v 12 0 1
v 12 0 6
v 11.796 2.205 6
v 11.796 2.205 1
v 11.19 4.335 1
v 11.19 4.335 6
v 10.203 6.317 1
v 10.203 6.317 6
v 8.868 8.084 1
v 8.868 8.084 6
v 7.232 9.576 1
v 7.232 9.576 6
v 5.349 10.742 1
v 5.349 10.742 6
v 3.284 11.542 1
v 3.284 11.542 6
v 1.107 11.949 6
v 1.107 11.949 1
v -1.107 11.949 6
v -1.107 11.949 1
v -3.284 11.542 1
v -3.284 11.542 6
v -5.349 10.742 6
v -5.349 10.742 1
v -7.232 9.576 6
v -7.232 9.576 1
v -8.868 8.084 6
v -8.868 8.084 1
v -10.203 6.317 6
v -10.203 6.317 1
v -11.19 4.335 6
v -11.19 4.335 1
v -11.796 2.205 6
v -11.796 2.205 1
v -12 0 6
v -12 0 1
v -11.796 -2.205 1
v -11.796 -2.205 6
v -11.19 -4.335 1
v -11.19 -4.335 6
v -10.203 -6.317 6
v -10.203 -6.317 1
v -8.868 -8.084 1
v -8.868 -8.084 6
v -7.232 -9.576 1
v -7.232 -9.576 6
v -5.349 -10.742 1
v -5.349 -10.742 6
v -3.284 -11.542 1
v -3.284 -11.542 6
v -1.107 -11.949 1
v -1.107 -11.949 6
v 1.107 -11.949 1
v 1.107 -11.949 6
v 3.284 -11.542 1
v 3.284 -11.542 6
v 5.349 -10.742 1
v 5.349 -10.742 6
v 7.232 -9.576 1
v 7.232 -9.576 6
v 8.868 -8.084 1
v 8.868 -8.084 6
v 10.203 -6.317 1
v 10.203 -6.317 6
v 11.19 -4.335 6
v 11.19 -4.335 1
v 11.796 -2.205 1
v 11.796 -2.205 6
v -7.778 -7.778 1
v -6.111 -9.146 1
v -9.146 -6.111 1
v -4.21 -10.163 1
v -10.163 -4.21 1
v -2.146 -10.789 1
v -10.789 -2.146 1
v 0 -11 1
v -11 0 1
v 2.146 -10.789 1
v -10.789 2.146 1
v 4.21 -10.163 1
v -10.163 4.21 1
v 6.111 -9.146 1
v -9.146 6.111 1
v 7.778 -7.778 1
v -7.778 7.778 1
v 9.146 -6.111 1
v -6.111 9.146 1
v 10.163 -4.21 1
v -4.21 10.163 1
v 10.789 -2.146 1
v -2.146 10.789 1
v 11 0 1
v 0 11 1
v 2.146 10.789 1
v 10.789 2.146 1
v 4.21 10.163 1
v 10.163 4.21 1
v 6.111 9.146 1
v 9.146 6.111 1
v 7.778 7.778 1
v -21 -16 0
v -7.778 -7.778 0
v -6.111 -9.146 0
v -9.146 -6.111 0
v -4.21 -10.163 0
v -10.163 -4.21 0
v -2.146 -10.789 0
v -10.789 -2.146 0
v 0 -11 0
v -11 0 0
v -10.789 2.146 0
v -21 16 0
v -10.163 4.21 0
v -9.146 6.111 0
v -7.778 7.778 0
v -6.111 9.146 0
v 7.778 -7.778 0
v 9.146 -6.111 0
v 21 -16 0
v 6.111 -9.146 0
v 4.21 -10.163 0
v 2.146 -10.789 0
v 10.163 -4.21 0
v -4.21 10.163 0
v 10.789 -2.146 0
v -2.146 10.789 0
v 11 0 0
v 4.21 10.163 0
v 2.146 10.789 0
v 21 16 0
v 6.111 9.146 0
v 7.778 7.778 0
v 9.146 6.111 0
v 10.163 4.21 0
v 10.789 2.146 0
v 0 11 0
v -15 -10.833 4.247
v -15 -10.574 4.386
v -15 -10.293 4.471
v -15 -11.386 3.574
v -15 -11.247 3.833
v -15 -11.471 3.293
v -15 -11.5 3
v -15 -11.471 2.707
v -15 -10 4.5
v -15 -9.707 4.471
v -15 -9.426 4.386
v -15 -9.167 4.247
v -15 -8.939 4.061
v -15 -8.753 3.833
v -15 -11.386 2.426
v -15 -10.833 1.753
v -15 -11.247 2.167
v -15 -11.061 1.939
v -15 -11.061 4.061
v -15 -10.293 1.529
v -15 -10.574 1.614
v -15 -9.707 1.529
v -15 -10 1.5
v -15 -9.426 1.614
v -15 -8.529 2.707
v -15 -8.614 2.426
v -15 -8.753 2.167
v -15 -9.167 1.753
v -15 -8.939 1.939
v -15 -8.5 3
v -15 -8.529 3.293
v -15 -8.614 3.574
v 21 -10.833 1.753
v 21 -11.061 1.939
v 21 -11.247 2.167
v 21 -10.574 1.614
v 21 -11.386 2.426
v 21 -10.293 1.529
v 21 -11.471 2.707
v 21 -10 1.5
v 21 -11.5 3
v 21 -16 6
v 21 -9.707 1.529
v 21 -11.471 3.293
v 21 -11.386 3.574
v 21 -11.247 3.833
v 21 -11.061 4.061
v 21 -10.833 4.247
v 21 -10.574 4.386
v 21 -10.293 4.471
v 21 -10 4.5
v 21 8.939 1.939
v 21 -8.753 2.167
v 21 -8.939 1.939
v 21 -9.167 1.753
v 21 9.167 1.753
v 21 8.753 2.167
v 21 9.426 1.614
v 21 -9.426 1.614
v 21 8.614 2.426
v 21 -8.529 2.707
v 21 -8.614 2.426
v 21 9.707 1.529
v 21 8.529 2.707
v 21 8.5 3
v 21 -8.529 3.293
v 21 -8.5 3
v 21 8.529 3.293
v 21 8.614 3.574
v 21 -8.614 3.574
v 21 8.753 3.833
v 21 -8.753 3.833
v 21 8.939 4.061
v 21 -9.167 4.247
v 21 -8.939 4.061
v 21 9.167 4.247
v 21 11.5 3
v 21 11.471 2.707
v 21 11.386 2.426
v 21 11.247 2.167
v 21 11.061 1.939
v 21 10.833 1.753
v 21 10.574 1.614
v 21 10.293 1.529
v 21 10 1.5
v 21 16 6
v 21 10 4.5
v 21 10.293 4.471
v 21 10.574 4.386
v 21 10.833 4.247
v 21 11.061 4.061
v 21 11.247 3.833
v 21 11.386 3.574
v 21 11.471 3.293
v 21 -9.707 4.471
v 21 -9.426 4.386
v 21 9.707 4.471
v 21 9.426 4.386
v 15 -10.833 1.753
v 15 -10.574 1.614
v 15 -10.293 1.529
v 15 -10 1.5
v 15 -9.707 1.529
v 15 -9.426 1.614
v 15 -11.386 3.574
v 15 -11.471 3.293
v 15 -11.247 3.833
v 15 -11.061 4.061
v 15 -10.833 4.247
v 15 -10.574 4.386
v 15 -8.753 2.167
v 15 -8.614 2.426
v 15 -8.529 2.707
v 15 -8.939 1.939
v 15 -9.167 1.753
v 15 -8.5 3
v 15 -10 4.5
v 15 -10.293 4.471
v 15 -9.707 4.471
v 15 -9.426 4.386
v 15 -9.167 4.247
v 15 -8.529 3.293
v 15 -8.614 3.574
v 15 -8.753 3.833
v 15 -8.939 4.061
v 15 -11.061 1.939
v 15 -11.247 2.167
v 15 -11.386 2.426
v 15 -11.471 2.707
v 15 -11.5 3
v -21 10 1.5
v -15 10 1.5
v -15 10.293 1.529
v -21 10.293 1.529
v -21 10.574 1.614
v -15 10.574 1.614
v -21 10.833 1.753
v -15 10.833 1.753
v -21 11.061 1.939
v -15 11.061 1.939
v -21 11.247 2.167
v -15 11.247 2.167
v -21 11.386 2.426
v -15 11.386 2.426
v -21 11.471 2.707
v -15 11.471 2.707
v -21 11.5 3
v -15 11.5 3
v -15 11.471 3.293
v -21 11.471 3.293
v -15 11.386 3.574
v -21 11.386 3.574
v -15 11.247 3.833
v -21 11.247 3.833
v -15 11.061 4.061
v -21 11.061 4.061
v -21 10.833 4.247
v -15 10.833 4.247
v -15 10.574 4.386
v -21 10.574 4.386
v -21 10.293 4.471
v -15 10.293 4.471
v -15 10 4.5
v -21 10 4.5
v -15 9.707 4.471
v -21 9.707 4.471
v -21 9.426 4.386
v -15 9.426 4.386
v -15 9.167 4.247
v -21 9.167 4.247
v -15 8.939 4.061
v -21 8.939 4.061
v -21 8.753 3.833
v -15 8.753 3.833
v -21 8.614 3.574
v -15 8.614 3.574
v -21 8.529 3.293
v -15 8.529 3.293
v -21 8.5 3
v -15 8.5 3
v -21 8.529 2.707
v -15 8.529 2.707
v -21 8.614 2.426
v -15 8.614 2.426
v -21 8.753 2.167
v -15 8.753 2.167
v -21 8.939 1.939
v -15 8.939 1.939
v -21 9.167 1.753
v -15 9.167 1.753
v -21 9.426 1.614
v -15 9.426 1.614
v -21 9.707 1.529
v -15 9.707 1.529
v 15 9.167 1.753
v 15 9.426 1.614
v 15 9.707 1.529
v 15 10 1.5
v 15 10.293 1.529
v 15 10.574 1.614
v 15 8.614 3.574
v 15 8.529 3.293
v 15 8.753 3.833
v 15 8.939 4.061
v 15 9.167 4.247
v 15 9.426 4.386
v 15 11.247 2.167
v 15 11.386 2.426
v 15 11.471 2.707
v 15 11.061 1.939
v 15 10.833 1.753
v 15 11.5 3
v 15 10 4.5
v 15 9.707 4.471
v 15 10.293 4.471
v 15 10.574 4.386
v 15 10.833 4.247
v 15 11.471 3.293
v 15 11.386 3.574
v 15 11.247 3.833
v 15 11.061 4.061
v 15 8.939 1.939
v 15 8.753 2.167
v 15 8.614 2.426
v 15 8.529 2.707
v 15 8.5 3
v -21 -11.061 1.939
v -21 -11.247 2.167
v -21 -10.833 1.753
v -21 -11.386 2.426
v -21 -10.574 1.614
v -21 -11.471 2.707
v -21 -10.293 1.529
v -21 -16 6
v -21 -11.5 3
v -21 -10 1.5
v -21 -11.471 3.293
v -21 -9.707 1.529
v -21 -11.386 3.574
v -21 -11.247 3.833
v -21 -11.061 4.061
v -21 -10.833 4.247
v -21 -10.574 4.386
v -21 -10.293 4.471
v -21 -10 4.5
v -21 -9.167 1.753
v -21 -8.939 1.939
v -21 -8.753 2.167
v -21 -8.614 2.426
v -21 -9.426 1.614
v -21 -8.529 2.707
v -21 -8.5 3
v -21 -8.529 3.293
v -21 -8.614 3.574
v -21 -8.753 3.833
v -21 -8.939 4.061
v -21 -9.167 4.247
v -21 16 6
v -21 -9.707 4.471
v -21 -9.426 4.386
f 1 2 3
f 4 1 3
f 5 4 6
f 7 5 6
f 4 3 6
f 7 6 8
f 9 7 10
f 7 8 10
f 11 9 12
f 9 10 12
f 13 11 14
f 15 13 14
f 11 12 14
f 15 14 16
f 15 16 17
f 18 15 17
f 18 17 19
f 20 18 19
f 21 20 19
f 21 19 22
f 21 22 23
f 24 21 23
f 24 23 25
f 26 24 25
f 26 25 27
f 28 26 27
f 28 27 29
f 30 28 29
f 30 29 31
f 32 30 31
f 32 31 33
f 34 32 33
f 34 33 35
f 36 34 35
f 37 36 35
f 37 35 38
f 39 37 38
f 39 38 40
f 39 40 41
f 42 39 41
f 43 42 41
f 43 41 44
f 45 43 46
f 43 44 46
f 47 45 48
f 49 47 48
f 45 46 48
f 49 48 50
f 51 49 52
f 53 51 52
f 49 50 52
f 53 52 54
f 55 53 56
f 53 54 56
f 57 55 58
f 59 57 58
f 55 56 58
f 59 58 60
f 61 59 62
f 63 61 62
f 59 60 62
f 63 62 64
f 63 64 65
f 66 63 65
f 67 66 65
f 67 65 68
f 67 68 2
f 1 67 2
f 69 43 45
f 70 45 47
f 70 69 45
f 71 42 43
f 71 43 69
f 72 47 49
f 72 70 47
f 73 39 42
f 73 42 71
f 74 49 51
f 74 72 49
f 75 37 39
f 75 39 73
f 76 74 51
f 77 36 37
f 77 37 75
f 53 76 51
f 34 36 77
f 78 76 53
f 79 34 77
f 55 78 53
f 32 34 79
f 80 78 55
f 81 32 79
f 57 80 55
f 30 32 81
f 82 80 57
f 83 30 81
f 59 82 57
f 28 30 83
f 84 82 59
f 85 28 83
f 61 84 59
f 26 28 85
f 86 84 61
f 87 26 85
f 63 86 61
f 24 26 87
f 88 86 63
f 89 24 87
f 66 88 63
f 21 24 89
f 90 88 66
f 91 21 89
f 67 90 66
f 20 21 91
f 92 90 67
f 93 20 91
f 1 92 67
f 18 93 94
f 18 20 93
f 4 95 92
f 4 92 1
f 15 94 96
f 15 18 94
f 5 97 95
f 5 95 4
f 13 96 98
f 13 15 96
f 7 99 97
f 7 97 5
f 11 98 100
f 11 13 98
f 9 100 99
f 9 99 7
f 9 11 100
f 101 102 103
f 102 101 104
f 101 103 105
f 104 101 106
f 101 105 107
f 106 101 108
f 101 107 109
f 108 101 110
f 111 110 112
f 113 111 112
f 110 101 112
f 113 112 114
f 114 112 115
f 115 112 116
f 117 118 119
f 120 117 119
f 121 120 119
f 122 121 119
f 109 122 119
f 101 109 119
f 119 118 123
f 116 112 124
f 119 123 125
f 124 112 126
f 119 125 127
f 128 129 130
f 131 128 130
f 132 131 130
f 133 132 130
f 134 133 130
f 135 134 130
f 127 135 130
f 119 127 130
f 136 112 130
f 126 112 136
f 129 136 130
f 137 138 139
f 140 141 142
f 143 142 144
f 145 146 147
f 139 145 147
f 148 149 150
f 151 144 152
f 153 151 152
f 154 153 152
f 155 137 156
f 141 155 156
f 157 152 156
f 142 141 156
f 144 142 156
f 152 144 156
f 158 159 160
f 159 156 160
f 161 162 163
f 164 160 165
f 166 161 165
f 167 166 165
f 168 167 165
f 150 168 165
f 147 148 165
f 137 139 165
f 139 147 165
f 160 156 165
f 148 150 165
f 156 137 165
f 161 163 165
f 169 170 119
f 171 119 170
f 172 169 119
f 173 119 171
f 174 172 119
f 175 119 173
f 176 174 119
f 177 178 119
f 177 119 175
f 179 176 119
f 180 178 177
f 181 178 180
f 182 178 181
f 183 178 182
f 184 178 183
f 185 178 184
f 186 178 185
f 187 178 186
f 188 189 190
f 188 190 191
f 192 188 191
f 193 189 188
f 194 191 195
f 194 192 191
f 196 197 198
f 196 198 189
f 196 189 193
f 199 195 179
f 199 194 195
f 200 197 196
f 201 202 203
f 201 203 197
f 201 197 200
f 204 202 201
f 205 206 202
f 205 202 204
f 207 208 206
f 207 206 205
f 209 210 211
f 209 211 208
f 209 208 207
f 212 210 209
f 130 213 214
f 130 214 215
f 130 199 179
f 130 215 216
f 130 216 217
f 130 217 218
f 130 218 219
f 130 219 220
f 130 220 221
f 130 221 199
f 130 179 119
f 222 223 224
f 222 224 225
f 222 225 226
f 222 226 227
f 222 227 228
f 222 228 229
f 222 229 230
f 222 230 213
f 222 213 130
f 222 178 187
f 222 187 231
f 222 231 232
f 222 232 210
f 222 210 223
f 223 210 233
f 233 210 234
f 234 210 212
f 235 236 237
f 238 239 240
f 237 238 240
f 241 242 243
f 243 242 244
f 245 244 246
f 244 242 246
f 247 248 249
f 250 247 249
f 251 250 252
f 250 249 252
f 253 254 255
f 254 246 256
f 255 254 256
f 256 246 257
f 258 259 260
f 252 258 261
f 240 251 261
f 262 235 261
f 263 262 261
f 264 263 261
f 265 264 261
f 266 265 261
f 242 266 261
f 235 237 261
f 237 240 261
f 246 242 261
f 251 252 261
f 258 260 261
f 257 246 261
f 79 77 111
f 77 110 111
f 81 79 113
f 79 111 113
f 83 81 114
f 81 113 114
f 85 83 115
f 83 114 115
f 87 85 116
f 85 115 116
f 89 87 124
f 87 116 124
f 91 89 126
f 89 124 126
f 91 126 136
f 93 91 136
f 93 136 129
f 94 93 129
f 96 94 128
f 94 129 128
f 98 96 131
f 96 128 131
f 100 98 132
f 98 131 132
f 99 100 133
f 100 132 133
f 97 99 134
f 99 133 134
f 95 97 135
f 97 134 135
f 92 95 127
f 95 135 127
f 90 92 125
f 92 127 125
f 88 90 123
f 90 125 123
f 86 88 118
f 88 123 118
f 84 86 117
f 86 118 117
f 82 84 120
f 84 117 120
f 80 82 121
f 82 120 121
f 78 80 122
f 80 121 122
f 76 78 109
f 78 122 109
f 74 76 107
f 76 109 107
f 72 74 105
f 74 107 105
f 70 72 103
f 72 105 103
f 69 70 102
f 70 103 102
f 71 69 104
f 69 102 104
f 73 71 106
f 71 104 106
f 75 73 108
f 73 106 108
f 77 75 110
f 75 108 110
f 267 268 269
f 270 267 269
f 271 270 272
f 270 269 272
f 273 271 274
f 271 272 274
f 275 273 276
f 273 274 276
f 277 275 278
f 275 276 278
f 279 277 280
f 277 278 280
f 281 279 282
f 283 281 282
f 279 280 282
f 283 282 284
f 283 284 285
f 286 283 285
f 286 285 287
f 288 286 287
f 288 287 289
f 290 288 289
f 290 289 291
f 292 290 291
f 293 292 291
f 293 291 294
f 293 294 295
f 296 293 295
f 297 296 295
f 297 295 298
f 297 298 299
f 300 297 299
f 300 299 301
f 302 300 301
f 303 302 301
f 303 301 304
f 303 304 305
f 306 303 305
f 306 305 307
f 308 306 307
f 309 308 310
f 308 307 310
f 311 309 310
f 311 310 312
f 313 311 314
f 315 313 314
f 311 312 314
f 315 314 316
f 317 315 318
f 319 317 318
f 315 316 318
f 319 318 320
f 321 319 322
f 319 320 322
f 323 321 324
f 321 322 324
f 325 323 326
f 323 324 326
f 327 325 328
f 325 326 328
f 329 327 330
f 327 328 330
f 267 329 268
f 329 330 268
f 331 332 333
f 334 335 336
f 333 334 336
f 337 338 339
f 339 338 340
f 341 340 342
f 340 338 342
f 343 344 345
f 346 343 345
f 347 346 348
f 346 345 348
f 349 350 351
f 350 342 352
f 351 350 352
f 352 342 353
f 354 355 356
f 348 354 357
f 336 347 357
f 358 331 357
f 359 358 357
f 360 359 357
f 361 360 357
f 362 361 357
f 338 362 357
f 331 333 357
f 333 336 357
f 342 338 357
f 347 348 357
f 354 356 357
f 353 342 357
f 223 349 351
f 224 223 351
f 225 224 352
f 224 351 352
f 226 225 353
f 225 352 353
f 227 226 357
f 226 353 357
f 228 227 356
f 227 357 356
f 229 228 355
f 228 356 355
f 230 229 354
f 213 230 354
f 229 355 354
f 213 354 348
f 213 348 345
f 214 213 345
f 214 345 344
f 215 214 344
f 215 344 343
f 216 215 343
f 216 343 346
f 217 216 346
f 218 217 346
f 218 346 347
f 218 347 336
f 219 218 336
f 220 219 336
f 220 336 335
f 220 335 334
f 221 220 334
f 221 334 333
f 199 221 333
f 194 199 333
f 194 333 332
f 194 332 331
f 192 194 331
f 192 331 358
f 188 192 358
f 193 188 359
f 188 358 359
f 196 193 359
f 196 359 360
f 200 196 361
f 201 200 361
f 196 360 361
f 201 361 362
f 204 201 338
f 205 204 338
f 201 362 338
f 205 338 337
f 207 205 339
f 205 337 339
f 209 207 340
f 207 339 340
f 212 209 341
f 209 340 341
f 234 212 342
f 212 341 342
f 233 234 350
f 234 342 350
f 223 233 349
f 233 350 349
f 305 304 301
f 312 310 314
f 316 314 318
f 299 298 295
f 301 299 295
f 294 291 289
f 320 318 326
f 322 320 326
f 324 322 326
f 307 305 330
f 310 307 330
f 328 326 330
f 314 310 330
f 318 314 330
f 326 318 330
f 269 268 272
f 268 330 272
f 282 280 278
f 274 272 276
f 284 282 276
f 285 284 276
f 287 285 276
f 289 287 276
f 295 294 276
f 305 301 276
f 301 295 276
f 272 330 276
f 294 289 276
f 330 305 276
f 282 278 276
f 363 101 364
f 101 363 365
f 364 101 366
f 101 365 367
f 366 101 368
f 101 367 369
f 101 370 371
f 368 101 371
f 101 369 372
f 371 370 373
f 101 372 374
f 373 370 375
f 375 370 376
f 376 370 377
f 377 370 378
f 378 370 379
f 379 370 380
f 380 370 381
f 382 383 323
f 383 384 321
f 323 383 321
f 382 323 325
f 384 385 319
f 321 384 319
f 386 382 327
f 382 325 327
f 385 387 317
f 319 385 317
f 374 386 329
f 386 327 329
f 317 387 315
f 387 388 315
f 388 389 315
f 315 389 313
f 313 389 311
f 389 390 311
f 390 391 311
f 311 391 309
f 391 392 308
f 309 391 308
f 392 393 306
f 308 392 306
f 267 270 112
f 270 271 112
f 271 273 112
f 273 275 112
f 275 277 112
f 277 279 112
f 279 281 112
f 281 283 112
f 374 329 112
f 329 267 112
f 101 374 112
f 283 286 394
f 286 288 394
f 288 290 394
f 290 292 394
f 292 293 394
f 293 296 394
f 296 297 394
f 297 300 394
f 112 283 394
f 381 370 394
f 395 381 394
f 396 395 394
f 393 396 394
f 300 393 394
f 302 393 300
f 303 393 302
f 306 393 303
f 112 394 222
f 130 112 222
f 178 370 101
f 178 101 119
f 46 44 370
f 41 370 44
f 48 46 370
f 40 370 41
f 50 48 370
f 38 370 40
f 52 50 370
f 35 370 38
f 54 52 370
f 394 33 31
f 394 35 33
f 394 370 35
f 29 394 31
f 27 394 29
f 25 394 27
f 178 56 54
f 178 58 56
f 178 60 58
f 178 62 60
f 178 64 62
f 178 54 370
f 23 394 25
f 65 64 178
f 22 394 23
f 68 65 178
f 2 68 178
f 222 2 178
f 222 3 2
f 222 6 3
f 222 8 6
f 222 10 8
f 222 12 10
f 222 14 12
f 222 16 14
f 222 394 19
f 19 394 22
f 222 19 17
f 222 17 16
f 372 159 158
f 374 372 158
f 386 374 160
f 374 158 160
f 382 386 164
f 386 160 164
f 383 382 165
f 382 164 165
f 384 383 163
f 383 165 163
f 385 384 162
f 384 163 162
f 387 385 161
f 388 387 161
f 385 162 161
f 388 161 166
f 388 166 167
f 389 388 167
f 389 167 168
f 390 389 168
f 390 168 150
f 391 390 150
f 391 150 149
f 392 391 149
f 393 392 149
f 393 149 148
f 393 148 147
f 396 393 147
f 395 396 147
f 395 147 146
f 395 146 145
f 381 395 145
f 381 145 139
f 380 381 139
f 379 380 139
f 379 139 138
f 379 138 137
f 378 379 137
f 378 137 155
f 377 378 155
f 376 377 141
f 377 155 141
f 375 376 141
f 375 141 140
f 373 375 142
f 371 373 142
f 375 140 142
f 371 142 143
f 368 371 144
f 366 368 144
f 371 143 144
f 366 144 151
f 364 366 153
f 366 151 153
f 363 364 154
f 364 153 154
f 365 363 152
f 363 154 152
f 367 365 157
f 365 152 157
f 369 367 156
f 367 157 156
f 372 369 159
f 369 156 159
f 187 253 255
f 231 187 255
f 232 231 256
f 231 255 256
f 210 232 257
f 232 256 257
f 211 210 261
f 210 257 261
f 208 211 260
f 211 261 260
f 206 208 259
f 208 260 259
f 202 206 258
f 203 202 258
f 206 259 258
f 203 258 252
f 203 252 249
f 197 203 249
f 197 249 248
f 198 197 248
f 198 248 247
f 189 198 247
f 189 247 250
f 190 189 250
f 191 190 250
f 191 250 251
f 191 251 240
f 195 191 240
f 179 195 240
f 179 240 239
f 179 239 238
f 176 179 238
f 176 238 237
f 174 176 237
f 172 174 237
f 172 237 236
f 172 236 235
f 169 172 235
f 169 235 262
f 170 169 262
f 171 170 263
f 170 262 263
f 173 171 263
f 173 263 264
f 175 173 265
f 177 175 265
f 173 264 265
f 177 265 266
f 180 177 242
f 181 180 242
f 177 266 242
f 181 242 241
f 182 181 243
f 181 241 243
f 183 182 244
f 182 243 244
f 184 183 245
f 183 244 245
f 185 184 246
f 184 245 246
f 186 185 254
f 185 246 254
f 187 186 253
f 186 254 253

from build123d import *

# Parameters (mm, degrees)
SKETCH_1_W                = 42
SKETCH_1_H                = 32
EXTRUDE_1_DEPTH           = 6
HOLE_WIZARD_3_0_3_1_D     = 3
HOLE_WIZARD_3_0_3_1_DEPTH = 6
HOLE_WIZARD_3_0_3_2_D     = 3
HOLE_WIZARD_3_0_3_2_DEPTH = 6
M24X2_0_1_D               = 22
M24X2_0_1_CBORE_D         = 24
M24X2_0_1_CBORE_DEPTH     = 4
SKETCH_8_R                = 12
CUT_EXTRUDE_1_DEPTH       = 5


with BuildPart() as part:
    # 草图1 → 凸台-拉伸1 (new body)
    with BuildSketch(Plane.XY.offset(6)):
        Rectangle(SKETCH_1_W, SKETCH_1_H)
    extrude(amount=-EXTRUDE_1_DEPTH)

    # Ø3.0 (3) 直径孔1
    with Locations(Plane(origin=(21, 0, 0), x_dir=(0, 0, -1), z_dir=(1, 0, 0))):
        with Locations((-3, -10), (-3, 10)):
            Hole(HOLE_WIZARD_3_0_3_1_D / 2, depth=HOLE_WIZARD_3_0_3_1_DEPTH)

    # Ø3.0 (3) 直径孔2
    with Locations(Plane.ZY.offset(21)):
        with Locations((3, -10), (3, 10)):
            Hole(HOLE_WIZARD_3_0_3_2_D / 2, depth=HOLE_WIZARD_3_0_3_2_DEPTH)

    # M24x2.0 螺纹孔1 (through all)
    with Locations(Plane.XY.offset(6)):
        with Locations((0, 0)):
            CounterBoreHole(M24X2_0_1_D / 2, M24X2_0_1_CBORE_D / 2, M24X2_0_1_CBORE_DEPTH)

    # 草图8 → 切除-拉伸1 (cut)
    with BuildSketch(Plane.XY.offset(6)):
        Circle(SKETCH_8_R)
    extrude(amount=-CUT_EXTRUDE_1_DEPTH, mode=Mode.SUBTRACT)


solid = part.part
